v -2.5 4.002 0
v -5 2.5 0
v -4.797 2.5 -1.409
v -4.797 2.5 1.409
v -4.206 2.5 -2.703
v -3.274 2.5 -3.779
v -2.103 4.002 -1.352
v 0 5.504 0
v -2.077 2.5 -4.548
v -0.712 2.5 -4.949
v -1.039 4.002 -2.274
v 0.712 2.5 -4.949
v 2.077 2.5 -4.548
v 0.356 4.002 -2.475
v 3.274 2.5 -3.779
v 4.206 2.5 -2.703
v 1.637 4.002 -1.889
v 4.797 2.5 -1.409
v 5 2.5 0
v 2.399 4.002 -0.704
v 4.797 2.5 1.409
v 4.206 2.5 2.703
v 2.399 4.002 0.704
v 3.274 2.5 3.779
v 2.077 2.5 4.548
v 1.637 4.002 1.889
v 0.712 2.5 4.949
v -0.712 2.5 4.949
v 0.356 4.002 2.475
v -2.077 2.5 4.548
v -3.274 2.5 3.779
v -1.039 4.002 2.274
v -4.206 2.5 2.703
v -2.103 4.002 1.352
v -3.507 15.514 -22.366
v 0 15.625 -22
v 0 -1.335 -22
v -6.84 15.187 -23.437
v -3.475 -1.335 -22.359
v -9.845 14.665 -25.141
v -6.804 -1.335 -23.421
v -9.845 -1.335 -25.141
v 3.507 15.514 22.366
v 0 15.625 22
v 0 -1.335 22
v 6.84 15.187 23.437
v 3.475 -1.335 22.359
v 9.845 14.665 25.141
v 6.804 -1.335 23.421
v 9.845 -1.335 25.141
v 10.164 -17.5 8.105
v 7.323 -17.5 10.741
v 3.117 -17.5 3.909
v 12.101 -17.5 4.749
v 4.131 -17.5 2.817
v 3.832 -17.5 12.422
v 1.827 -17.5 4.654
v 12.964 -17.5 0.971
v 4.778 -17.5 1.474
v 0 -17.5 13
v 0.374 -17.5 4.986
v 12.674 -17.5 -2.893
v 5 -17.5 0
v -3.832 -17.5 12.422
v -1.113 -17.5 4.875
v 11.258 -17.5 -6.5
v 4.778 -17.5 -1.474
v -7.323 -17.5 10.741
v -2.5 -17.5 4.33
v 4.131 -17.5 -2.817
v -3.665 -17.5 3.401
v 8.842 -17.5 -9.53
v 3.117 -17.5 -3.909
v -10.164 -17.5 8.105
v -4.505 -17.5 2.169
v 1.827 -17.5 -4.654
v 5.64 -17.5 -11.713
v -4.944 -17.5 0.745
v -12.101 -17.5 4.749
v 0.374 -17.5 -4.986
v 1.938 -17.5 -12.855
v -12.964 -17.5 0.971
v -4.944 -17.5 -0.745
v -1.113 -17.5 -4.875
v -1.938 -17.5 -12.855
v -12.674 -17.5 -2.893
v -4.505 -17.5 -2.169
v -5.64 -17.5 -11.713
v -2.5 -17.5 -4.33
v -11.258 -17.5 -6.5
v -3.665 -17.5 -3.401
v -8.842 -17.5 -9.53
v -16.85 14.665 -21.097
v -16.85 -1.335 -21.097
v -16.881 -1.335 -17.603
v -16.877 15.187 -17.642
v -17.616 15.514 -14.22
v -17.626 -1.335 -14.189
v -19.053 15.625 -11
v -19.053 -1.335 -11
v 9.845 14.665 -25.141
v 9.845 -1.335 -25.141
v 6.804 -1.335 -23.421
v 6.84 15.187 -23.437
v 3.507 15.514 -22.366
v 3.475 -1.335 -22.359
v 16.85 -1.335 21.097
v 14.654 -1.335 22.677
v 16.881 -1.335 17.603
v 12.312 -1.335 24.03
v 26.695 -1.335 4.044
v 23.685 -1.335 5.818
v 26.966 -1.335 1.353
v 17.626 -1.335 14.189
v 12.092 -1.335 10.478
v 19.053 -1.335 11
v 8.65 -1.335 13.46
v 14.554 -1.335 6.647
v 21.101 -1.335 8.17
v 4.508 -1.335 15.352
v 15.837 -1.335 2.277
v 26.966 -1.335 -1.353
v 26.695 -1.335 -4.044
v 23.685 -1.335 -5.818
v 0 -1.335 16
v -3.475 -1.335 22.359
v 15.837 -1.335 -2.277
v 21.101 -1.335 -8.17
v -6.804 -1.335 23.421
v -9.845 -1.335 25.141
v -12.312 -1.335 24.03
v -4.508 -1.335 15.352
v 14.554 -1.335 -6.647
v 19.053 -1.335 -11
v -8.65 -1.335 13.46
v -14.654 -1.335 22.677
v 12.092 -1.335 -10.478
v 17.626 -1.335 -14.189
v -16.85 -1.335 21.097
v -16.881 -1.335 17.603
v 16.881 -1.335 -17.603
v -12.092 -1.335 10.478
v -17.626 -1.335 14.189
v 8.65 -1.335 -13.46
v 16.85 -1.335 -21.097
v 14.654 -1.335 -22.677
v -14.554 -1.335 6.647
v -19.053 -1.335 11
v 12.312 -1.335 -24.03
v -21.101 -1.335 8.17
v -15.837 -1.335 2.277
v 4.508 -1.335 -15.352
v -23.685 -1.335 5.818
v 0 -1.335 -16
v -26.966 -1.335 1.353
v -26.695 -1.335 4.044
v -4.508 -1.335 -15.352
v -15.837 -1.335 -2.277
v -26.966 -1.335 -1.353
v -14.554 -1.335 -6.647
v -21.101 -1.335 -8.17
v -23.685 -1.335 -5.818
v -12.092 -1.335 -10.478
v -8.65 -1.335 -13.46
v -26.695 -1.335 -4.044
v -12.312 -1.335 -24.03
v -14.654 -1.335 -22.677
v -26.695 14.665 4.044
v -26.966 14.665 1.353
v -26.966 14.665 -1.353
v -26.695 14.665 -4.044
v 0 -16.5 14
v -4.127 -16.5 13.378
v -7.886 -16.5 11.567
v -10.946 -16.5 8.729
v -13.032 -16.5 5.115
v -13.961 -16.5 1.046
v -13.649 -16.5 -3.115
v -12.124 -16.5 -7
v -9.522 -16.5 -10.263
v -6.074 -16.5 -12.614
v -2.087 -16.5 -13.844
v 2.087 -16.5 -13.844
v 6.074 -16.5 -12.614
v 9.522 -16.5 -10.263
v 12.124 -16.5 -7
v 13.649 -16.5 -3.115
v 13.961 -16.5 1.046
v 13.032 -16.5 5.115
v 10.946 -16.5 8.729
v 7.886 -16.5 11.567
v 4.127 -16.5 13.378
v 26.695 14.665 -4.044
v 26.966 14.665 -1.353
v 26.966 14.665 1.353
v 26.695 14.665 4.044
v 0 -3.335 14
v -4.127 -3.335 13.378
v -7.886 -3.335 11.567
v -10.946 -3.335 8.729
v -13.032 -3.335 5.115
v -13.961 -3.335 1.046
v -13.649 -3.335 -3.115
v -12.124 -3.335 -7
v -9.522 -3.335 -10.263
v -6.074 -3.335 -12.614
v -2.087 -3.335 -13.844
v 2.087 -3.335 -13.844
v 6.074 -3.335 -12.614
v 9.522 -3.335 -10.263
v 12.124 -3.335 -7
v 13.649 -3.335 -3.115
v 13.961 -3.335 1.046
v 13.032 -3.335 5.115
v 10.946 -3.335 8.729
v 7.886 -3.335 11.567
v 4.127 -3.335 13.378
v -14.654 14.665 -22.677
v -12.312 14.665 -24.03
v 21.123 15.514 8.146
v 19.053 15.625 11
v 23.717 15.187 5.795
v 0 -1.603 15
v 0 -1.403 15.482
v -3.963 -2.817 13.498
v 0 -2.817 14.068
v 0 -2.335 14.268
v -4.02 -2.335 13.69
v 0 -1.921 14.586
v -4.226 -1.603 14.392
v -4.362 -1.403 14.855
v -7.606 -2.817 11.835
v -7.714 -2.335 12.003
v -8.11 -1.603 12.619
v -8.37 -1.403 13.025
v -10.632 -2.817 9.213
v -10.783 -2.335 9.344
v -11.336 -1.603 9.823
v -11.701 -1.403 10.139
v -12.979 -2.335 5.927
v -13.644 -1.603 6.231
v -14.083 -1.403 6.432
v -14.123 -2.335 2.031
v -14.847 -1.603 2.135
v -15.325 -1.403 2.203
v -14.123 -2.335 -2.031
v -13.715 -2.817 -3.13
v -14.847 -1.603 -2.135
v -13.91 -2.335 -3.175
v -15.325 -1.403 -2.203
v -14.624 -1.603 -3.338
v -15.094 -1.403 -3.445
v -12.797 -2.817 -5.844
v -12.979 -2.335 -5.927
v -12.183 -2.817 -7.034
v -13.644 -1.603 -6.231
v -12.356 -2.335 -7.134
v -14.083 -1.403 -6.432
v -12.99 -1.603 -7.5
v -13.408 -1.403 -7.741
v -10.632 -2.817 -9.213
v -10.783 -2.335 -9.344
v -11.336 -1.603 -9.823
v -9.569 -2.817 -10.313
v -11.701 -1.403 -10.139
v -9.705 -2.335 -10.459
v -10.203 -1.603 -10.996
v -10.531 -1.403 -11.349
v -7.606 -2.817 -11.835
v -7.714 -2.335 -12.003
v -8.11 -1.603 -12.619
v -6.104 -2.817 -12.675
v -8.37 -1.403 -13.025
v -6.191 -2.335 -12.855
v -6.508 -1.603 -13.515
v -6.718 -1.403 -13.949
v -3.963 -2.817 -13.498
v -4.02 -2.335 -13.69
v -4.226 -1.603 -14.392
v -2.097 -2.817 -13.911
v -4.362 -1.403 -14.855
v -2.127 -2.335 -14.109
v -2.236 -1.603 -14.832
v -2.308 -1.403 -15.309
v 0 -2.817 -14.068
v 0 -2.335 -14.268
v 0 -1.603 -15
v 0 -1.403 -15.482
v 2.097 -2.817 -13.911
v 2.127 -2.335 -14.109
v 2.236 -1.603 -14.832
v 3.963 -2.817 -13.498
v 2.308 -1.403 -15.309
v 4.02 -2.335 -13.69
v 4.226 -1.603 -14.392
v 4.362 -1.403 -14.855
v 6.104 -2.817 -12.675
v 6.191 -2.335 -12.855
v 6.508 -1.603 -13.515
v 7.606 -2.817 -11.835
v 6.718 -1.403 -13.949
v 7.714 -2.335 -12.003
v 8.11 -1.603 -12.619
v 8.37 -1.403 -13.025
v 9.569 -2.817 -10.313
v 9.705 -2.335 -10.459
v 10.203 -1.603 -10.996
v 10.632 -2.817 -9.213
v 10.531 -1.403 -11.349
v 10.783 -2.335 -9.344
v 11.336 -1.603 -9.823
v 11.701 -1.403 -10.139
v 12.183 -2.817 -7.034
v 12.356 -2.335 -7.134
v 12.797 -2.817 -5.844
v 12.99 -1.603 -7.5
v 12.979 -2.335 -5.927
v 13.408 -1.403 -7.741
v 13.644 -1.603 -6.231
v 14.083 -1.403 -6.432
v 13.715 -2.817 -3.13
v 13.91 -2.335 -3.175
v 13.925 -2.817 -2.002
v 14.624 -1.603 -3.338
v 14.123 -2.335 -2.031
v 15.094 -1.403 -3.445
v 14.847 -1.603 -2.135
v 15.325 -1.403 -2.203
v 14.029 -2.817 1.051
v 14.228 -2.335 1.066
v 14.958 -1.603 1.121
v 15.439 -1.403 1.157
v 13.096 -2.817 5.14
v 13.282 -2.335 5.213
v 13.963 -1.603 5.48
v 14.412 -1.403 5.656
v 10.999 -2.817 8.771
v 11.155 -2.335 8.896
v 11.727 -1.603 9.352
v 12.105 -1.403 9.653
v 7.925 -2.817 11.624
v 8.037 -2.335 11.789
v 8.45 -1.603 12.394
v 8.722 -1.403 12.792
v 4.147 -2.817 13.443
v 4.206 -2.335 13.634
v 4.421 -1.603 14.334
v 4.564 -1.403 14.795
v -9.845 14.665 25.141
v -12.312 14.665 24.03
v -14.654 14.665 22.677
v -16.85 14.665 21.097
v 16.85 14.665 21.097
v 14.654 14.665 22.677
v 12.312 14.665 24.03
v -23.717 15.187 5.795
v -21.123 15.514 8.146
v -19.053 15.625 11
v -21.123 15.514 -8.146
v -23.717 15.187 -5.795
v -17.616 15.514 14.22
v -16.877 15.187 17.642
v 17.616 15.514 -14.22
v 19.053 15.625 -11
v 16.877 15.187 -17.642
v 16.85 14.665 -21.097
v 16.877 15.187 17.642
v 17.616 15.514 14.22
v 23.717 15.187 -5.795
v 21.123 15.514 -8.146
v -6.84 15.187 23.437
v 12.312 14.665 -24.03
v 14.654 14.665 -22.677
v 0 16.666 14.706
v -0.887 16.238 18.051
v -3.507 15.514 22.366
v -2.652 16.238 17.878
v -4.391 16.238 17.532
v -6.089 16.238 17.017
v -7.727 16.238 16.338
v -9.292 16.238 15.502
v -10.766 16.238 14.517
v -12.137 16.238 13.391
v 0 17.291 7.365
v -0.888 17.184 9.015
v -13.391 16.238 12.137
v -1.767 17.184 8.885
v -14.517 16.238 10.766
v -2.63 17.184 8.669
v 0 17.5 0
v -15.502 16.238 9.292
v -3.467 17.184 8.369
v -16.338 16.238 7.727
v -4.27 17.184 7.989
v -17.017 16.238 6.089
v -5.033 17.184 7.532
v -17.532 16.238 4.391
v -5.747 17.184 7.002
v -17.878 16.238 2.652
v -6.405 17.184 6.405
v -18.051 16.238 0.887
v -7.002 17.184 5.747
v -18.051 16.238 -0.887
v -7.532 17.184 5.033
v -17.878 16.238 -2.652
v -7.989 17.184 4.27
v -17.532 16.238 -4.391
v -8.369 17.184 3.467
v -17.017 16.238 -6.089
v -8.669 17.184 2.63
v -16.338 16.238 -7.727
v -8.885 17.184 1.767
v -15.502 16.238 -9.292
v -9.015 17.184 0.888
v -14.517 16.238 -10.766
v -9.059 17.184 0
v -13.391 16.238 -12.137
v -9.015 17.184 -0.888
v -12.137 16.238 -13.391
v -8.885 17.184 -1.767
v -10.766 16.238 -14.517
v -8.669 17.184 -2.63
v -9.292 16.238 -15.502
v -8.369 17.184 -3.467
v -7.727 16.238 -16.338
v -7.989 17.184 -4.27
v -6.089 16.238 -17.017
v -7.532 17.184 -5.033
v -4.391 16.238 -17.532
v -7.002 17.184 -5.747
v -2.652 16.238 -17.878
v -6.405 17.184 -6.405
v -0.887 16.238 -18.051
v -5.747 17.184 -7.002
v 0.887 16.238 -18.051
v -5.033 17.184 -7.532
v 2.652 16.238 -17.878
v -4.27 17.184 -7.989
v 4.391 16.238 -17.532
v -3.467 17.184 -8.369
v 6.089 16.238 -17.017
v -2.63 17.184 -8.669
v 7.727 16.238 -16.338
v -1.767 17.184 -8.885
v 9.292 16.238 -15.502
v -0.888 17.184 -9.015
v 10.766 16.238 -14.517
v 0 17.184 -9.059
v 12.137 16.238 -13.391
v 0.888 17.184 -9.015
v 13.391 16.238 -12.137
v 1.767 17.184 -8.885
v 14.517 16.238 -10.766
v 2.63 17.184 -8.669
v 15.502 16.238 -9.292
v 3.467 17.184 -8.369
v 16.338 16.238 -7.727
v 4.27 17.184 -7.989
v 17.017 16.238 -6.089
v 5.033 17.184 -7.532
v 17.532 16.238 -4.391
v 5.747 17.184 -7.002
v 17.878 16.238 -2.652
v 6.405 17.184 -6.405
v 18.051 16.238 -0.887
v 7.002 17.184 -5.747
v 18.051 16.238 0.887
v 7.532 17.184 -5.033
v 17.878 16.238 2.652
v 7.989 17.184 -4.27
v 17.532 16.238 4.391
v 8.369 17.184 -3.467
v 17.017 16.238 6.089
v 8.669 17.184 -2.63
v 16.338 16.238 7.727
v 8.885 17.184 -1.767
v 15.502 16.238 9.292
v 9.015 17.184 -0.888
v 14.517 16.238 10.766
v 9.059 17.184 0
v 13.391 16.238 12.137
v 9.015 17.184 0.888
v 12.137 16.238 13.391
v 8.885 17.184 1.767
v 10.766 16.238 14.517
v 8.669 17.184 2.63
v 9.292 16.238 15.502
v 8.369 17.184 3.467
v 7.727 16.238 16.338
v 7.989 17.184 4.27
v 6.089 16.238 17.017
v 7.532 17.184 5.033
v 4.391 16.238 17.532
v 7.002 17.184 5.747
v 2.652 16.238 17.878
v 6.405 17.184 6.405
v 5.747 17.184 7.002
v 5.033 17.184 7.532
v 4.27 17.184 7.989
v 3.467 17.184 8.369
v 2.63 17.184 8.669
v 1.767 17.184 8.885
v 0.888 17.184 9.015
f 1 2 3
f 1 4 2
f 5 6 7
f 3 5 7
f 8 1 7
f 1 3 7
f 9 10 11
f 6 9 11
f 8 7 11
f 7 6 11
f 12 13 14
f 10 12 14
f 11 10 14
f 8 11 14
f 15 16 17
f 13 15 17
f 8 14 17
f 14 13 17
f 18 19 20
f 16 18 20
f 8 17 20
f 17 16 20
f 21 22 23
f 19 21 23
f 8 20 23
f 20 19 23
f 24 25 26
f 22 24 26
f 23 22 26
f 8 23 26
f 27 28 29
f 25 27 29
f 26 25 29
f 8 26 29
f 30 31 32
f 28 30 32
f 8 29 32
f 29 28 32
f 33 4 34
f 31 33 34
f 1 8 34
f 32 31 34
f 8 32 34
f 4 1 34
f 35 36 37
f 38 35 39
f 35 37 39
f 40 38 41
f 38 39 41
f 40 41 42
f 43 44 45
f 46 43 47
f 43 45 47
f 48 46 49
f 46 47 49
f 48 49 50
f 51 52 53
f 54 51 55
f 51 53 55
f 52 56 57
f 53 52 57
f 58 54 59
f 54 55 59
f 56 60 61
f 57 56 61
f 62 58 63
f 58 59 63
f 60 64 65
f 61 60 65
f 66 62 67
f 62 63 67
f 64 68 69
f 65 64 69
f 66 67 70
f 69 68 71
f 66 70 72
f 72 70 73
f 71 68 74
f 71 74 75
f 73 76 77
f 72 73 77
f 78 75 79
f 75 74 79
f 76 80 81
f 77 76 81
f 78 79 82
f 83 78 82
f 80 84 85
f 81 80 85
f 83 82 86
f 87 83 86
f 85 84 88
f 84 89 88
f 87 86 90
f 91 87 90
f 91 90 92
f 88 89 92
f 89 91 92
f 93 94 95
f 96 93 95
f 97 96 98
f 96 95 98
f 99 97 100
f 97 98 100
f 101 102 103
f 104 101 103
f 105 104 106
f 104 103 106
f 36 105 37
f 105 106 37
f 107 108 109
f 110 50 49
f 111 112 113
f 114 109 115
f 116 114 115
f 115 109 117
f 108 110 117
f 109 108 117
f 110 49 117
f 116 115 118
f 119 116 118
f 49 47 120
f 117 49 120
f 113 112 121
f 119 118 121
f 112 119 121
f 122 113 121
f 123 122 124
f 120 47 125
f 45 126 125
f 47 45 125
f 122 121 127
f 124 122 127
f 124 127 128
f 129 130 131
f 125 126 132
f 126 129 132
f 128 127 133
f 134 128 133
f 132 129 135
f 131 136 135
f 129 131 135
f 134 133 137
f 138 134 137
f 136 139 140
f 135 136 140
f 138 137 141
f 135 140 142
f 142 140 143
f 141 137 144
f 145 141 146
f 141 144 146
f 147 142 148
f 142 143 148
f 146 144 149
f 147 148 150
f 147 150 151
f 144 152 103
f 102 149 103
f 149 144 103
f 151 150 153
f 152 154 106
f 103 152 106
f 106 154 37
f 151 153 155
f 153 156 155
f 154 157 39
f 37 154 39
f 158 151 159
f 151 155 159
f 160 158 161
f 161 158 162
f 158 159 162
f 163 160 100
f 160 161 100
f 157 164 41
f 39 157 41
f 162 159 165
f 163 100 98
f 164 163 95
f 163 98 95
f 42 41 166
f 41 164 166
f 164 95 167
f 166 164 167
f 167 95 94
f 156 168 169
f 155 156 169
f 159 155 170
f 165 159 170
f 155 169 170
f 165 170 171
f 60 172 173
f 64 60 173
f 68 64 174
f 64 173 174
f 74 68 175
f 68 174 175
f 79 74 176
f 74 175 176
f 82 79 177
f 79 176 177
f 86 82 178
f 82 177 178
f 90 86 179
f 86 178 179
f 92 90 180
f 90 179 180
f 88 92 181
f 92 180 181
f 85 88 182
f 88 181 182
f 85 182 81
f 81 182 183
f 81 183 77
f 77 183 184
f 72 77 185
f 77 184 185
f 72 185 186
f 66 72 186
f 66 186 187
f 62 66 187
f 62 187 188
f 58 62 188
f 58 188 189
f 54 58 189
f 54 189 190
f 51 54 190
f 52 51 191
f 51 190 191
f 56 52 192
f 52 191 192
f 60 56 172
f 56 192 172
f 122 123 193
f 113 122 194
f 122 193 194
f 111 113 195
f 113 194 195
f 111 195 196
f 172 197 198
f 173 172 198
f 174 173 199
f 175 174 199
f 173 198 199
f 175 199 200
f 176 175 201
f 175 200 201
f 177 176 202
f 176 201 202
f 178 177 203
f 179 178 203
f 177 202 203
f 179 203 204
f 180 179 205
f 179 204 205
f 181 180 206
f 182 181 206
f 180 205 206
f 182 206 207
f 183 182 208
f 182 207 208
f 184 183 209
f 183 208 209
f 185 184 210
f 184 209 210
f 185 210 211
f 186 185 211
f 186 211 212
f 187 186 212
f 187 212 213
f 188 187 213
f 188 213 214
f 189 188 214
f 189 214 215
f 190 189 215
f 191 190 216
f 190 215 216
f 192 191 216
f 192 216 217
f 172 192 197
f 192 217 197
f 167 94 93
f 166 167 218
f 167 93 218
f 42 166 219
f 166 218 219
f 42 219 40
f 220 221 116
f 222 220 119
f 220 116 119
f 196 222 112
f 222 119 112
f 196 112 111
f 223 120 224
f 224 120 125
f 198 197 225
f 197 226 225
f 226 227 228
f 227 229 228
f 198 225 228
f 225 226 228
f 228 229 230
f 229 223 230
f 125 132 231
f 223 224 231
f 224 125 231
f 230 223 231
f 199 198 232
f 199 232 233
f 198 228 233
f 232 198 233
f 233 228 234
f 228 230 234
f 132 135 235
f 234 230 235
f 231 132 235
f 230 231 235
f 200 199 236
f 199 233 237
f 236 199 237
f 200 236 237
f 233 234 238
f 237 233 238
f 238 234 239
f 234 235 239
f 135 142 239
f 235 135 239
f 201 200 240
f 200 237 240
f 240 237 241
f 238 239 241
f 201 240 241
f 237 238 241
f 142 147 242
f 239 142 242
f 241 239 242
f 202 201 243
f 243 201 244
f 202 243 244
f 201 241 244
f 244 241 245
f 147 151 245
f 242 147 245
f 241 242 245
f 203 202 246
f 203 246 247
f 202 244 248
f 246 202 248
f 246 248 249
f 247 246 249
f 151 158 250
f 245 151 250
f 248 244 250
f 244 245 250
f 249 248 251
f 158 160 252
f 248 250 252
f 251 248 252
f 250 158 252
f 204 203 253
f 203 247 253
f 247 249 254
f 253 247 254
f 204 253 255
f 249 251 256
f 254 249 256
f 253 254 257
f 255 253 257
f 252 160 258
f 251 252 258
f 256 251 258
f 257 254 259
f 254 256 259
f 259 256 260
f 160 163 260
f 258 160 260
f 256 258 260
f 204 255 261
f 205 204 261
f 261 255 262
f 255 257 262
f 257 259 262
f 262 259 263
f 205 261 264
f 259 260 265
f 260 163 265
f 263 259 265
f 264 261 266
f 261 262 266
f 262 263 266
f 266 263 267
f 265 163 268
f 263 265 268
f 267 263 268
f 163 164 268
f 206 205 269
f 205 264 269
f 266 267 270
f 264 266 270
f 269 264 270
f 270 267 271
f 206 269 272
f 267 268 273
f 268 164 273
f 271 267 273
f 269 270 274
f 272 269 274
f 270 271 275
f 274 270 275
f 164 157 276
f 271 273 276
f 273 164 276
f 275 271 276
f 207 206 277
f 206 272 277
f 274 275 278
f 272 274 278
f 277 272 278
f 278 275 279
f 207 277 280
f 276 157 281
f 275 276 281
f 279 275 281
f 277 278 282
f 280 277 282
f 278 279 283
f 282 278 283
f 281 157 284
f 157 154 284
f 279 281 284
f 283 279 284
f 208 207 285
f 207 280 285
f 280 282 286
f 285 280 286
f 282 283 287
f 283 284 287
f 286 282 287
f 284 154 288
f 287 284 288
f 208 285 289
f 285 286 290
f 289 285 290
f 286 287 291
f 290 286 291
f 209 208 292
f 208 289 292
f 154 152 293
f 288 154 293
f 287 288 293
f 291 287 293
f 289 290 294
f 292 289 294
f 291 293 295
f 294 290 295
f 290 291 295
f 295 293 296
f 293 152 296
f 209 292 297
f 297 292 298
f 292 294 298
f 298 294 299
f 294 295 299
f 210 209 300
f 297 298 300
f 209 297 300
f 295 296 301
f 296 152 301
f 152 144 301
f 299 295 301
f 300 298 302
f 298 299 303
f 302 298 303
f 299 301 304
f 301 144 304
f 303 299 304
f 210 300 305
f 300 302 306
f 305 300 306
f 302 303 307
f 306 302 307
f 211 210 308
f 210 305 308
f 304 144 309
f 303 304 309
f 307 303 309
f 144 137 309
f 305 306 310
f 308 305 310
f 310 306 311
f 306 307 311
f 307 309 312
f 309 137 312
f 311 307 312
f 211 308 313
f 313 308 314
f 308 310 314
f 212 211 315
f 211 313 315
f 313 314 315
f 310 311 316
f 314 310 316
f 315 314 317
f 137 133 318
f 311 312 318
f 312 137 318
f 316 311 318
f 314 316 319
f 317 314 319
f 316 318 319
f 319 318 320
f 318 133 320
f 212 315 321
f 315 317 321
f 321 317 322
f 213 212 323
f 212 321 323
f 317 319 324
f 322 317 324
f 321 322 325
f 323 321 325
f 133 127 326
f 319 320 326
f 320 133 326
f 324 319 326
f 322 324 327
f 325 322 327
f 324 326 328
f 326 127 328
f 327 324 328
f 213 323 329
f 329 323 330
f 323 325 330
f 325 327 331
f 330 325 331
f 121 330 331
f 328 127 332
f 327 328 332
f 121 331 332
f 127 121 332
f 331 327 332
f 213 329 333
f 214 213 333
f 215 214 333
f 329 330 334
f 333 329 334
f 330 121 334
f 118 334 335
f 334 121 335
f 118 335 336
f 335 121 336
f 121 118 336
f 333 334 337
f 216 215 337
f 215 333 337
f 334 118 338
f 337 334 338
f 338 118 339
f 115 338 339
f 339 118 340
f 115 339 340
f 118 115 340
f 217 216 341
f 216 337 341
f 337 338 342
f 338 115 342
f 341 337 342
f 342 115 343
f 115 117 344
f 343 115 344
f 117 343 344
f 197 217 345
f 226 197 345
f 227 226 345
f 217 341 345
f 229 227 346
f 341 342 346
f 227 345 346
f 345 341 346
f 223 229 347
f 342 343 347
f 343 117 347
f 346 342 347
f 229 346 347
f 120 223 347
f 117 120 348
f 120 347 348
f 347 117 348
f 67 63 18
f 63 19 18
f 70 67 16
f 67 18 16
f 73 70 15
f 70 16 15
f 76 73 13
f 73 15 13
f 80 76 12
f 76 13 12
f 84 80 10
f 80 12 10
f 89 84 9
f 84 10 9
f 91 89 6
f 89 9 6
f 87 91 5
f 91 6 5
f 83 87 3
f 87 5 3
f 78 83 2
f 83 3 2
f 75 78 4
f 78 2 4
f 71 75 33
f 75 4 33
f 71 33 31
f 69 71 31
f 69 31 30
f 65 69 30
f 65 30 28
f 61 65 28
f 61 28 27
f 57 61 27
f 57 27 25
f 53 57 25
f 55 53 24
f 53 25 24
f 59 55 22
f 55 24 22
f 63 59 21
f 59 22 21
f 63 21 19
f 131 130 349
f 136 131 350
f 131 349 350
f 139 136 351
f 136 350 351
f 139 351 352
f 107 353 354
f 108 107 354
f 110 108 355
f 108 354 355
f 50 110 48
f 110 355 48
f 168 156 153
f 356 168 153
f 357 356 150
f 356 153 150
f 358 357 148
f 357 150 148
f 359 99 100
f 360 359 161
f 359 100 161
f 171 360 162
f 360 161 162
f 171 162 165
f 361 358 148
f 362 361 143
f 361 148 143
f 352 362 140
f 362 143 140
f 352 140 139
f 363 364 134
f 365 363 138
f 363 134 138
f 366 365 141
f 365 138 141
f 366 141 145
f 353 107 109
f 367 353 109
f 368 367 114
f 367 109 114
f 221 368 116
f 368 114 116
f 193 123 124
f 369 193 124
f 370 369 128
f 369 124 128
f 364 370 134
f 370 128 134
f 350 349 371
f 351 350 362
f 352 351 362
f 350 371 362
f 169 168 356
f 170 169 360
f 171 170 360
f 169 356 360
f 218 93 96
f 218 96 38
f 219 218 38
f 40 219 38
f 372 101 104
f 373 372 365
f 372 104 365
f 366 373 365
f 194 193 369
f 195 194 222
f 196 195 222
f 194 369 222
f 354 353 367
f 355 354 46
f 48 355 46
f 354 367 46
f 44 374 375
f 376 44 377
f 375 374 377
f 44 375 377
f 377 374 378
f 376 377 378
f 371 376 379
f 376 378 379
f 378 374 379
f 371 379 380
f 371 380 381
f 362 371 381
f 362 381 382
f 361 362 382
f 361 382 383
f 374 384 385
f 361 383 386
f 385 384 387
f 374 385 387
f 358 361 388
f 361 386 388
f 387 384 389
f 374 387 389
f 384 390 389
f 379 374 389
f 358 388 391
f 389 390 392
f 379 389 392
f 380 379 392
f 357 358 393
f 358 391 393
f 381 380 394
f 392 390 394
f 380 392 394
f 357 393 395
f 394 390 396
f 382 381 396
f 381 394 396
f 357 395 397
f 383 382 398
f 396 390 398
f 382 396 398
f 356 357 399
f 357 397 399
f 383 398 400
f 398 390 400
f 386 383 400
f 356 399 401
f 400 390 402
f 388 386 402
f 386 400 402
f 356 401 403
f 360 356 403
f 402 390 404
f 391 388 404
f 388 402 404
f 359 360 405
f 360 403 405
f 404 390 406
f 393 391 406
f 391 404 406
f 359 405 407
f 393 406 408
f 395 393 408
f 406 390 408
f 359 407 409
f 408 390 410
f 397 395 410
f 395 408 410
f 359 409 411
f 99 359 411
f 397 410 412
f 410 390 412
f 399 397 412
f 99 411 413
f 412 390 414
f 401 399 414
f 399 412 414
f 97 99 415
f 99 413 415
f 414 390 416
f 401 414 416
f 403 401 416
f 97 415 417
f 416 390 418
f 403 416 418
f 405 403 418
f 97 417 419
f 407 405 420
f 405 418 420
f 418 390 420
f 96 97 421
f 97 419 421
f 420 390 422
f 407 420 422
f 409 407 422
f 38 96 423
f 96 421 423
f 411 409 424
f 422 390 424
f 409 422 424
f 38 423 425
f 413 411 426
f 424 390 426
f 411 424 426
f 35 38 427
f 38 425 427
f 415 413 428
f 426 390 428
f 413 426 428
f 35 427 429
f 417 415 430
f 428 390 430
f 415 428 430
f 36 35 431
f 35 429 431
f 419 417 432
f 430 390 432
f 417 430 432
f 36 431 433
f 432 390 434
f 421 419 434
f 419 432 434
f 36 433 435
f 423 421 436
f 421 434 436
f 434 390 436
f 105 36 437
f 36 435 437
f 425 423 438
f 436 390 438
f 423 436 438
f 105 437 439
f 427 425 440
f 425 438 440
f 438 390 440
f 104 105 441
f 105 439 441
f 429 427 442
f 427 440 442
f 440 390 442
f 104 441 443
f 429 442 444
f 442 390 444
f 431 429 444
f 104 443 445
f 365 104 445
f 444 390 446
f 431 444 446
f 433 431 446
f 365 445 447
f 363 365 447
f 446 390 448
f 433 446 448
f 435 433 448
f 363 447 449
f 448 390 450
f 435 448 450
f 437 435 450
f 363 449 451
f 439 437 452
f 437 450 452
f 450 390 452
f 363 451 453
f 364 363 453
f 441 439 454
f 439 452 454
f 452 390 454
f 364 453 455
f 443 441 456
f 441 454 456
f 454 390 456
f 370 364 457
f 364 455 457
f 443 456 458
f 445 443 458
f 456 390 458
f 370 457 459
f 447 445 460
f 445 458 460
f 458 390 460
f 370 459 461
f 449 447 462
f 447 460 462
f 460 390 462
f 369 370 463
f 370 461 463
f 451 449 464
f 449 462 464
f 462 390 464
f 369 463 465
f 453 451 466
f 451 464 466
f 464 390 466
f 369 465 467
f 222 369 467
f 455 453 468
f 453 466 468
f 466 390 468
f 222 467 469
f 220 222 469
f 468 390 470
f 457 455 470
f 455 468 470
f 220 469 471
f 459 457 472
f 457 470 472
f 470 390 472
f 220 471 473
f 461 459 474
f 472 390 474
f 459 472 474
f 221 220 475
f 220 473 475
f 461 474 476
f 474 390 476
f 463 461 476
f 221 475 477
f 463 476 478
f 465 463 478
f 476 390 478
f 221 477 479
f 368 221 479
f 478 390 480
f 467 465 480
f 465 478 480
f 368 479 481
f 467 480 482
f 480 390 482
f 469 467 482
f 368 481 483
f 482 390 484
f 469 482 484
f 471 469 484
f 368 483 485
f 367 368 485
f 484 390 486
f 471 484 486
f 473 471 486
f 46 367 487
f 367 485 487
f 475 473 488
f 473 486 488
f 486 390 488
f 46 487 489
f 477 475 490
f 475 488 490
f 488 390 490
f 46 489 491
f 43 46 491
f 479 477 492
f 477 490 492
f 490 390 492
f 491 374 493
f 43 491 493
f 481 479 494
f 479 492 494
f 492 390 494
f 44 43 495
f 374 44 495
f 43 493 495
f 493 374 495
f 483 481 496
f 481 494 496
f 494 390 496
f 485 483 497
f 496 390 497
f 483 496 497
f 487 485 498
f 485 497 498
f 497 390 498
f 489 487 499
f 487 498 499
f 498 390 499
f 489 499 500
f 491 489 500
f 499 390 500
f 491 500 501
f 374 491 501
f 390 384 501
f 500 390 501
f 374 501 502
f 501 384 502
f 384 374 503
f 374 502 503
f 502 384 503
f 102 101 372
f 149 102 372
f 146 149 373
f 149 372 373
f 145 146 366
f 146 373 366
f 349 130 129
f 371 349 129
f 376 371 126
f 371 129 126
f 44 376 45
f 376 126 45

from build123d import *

# Parameters (mm, degrees)
CHAMFER_1_SIZE           = 1
CUT_EXTRUDE_1_DEPTH      = 43.576377572
PATTERN_CIRCULAR_1_COUNT = 6
MM_1_D                   = 10
MM_1_DEPTH               = 20
MM_1_TIP                 = 3.004303095


with BuildPart() as part:
    # 草图1 → 旋转1 (revolve)
    with BuildSketch(Plane.XY, mode=Mode.PRIVATE) as revolve_1_sk:
        with BuildLine():
            Line((0, 17.5), (0, -17.5))
            Line((0, -17.5), (-14, -17.5))
            Line((-14, -17.5), (-14, -3.334753175))
            ThreePointArc((-14, -3.334753175), (-14.585786438, -1.920539613), (-16, -1.334753175))
            Line((-16, -1.334753175), (-27, -1.334753175))
            Line((-27, -1.334753175), (-27, 14.665246825))
            ThreePointArc((-27, 14.665246825), (-13.574201869, 16.789369415), (0, 17.5))
        make_face()
    revolve(revolve_1_sk.sketch.rotate(Axis((0, 51.094488189, 0), (0, -1, 0)), 270), axis=Axis((0, 51.094488189, 0), (0, -1, 0)))

    # 倒角1
    chamfer_1_edges = [part.edges().sort_by_distance(p)[0] for p in [
        (0, -17.5, -14),
    ]]
    chamfer(chamfer_1_edges, length=CHAMFER_1_SIZE)

    # 草图3 → 切除-拉伸1 (cut, through all)
    with BuildSketch(Plane.XZ.offset(1.334753175)):
        with BuildLine():
            ThreePointArc((9.845244015, 25.141025641), (5.009606157, 26.531186294), (0, 27))
            Line((0, 27), (0, 22))
            ThreePointArc((-2.3e-08, 22), (5.167080204, 22.804281981), (9.845244015, 25.141025641))
        make_face()
        with BuildLine():
            Line((0, 22), (0, 27))
            ThreePointArc((0, 27), (-5.009606157, 26.531186294), (-9.845244015, 25.141025641))
            ThreePointArc((-9.845244015, 25.141025641), (-5.167080226, 22.804281988), (-2.3e-08, 22))
        make_face()
    cut_extrude_1 = extrude(amount=-CUT_EXTRUDE_1_DEPTH, mode=Mode.SUBTRACT)

    # 阵列(圆周)1: 切除-拉伸1 ×6 about axis
    pattern_circular_1_axis = Axis((0, 0, 0), (0, 1, 0))
    for i in range(1, PATTERN_CIRCULAR_1_COUNT):
        add(cut_extrude_1.rotate(pattern_circular_1_axis, i * 360 / PATTERN_CIRCULAR_1_COUNT), mode=Mode.SUBTRACT)

    # 大小mm 暗销孔1
    with Locations(Plane(origin=(0, -17.5, 0), x_dir=(-1, 0, 0), z_dir=(0, -1, 0))):
        with Locations((0, 0)):
            Hole(MM_1_D / 2, depth=MM_1_DEPTH)
            with Locations((0, 0, -(MM_1_DEPTH + MM_1_TIP / 2))):  # 118° drill point
                Cone(0, MM_1_D / 2, MM_1_TIP, mode=Mode.SUBTRACT)


solid = part.part
